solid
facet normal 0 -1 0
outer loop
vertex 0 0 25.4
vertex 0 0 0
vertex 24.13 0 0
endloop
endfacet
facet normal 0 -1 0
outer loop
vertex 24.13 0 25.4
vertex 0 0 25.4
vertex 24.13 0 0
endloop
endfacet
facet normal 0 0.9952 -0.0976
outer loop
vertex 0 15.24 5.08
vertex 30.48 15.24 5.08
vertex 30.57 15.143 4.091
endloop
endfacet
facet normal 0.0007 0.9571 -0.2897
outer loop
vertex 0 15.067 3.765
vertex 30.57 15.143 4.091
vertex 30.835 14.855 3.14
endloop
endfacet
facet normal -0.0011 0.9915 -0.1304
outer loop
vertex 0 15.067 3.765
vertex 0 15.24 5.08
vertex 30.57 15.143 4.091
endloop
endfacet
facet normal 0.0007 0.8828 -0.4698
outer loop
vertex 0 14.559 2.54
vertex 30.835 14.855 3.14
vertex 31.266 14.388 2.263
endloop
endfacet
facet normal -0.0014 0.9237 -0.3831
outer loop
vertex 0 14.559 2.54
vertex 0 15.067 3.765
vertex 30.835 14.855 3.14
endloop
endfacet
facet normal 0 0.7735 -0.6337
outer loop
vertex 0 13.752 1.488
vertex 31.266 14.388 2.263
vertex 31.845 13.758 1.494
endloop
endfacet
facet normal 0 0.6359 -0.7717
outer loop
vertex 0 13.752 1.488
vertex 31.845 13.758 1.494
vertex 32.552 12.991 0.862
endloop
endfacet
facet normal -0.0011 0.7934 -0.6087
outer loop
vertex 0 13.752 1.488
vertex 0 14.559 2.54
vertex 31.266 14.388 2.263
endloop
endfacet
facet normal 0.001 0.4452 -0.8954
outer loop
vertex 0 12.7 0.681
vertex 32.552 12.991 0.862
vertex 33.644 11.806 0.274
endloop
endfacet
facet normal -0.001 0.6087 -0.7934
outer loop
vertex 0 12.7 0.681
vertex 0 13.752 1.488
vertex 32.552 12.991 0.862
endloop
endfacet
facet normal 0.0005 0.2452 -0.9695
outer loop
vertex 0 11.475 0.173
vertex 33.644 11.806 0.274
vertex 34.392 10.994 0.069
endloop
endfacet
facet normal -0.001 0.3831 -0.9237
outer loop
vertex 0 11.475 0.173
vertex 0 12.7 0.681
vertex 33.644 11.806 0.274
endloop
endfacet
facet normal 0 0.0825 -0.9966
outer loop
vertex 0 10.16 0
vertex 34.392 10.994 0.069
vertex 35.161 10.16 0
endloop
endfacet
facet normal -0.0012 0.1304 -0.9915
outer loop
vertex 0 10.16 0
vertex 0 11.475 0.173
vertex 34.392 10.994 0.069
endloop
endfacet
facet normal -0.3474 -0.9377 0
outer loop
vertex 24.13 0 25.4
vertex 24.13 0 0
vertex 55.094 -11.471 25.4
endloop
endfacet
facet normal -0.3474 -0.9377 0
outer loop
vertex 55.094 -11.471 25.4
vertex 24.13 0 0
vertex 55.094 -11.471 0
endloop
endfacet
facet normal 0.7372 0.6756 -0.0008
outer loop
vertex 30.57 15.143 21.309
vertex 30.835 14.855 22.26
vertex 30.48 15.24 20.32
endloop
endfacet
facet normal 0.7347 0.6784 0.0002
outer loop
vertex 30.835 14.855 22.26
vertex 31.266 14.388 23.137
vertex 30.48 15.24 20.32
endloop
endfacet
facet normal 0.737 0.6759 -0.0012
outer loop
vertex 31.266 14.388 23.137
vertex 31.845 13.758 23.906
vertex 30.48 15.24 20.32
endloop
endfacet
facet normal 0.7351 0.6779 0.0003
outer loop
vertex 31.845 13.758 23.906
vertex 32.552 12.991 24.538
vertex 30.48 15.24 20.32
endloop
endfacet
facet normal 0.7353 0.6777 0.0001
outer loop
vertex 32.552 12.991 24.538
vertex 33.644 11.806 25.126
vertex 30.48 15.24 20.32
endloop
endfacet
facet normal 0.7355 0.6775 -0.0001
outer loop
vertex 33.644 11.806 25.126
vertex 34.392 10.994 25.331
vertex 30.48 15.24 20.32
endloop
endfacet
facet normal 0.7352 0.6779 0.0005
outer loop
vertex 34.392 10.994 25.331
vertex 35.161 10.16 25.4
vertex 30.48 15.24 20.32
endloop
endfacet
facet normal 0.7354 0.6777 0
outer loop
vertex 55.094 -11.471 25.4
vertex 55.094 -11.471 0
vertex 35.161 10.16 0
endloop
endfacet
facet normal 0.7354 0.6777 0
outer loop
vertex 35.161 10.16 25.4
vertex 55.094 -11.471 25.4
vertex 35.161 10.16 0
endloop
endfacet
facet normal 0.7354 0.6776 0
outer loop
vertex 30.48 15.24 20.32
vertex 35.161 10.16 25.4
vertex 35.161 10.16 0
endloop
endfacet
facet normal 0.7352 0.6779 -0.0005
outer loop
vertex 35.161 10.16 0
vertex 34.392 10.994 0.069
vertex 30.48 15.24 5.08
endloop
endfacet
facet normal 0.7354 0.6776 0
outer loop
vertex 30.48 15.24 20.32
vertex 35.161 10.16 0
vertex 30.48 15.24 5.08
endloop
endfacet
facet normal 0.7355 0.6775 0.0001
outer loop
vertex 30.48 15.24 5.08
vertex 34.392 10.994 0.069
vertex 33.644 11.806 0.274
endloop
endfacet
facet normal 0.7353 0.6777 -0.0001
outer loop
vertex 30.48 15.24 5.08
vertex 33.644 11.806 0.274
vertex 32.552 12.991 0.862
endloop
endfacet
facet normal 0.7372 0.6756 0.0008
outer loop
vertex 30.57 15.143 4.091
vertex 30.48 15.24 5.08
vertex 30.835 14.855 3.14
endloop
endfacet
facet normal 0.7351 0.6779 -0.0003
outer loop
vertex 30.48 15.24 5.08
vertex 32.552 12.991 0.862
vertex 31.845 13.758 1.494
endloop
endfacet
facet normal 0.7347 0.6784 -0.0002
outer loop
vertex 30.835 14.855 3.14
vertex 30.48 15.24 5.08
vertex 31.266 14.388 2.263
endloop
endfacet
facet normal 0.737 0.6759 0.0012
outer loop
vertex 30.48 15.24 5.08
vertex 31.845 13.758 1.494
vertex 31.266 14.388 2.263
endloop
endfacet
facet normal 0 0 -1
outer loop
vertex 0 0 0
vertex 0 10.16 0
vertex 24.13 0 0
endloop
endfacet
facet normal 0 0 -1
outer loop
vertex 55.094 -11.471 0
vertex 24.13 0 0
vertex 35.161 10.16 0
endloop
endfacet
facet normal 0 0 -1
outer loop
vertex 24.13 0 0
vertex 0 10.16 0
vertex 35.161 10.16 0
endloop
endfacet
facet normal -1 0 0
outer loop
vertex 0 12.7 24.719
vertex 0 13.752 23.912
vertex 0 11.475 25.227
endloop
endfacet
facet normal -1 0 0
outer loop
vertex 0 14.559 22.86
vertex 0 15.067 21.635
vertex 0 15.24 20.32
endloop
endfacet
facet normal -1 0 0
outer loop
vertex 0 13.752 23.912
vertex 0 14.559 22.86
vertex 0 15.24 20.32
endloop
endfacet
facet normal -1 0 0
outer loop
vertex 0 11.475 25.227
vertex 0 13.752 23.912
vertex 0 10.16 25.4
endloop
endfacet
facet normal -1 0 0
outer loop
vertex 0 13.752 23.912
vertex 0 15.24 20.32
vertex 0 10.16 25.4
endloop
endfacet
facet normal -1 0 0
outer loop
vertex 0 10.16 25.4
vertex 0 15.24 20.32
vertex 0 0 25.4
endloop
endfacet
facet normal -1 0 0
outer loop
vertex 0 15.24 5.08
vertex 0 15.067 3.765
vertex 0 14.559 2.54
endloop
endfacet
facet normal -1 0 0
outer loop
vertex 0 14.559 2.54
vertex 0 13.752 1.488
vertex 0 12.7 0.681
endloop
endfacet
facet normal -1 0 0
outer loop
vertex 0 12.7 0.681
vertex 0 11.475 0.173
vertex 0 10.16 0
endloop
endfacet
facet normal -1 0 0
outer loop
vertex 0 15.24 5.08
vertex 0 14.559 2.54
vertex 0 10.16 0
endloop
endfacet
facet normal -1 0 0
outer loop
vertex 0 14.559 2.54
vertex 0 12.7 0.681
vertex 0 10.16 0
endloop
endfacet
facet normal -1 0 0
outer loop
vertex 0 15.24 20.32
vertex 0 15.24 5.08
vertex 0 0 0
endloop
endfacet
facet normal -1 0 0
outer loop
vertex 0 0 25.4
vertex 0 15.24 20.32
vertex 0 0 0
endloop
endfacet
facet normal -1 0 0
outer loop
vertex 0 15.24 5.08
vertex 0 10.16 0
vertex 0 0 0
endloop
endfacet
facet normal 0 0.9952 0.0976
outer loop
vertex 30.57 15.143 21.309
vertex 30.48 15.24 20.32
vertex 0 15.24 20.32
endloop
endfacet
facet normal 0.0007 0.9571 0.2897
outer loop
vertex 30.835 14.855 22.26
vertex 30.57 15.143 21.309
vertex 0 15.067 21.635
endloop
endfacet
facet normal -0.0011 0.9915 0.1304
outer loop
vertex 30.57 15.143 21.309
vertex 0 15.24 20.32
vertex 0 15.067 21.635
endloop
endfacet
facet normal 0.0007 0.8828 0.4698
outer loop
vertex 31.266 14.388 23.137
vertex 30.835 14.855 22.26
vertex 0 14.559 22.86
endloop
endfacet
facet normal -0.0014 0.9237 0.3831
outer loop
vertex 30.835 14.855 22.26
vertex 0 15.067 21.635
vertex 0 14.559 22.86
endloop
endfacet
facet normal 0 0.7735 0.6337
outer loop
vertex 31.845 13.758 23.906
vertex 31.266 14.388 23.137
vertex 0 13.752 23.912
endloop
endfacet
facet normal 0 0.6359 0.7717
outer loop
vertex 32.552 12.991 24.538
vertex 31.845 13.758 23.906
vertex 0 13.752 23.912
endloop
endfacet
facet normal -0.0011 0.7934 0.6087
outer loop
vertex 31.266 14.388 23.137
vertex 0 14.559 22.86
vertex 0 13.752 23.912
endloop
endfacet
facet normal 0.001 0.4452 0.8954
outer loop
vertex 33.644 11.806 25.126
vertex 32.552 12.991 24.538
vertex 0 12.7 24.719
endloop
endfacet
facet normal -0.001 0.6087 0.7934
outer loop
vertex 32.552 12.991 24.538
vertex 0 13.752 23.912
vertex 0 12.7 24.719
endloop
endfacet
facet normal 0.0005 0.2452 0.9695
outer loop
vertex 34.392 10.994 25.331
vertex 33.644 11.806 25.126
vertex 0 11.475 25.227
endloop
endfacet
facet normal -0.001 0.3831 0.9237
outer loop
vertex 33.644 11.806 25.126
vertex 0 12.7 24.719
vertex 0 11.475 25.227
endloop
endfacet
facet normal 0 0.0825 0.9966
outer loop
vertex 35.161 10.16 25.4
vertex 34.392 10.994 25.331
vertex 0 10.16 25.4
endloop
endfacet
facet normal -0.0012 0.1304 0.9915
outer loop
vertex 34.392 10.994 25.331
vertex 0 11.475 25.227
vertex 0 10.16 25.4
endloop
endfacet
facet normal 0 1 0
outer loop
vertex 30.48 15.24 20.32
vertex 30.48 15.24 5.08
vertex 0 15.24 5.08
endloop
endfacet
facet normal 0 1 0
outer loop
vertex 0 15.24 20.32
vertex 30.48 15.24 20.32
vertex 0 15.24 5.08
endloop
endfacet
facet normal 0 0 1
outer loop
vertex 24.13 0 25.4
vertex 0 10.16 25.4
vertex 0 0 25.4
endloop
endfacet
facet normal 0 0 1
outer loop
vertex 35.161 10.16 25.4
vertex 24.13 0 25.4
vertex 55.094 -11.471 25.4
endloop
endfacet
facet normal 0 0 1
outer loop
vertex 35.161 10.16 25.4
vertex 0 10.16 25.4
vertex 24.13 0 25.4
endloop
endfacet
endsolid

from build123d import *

# Parameters (mm, degrees)
F1_DEPTH = 25.4
F2_R     = 5.08
F3_R     = 5.08


# Not quite as in the source:
# - a feature names something its author has since deleted; it is built from what else it names


with BuildPart() as f1:
    # F0 (on Top) → F1 (new body)
    with BuildSketch(Plane.XY):
        Polygon((0, 15.24), (0, 0), (24.13, 0), (55.0936062386, -11.4706359327), (30.48, 15.24), align=None)
    extrude(amount=F1_DEPTH)

    # F2
    f2_edges = [f1.edges().sort_by_distance(p)[0] for p in [
        (15.24, 15.24, 25.4),
    ]]
    fillet(f2_edges, radius=F2_R)

    # F3
    f3_edges = [f1.edges().sort_by_distance(p)[0] for p in [
        (15.24, 15.24, 0),
    ]]
    fillet(f3_edges, radius=F3_R)


solid = f1.part
